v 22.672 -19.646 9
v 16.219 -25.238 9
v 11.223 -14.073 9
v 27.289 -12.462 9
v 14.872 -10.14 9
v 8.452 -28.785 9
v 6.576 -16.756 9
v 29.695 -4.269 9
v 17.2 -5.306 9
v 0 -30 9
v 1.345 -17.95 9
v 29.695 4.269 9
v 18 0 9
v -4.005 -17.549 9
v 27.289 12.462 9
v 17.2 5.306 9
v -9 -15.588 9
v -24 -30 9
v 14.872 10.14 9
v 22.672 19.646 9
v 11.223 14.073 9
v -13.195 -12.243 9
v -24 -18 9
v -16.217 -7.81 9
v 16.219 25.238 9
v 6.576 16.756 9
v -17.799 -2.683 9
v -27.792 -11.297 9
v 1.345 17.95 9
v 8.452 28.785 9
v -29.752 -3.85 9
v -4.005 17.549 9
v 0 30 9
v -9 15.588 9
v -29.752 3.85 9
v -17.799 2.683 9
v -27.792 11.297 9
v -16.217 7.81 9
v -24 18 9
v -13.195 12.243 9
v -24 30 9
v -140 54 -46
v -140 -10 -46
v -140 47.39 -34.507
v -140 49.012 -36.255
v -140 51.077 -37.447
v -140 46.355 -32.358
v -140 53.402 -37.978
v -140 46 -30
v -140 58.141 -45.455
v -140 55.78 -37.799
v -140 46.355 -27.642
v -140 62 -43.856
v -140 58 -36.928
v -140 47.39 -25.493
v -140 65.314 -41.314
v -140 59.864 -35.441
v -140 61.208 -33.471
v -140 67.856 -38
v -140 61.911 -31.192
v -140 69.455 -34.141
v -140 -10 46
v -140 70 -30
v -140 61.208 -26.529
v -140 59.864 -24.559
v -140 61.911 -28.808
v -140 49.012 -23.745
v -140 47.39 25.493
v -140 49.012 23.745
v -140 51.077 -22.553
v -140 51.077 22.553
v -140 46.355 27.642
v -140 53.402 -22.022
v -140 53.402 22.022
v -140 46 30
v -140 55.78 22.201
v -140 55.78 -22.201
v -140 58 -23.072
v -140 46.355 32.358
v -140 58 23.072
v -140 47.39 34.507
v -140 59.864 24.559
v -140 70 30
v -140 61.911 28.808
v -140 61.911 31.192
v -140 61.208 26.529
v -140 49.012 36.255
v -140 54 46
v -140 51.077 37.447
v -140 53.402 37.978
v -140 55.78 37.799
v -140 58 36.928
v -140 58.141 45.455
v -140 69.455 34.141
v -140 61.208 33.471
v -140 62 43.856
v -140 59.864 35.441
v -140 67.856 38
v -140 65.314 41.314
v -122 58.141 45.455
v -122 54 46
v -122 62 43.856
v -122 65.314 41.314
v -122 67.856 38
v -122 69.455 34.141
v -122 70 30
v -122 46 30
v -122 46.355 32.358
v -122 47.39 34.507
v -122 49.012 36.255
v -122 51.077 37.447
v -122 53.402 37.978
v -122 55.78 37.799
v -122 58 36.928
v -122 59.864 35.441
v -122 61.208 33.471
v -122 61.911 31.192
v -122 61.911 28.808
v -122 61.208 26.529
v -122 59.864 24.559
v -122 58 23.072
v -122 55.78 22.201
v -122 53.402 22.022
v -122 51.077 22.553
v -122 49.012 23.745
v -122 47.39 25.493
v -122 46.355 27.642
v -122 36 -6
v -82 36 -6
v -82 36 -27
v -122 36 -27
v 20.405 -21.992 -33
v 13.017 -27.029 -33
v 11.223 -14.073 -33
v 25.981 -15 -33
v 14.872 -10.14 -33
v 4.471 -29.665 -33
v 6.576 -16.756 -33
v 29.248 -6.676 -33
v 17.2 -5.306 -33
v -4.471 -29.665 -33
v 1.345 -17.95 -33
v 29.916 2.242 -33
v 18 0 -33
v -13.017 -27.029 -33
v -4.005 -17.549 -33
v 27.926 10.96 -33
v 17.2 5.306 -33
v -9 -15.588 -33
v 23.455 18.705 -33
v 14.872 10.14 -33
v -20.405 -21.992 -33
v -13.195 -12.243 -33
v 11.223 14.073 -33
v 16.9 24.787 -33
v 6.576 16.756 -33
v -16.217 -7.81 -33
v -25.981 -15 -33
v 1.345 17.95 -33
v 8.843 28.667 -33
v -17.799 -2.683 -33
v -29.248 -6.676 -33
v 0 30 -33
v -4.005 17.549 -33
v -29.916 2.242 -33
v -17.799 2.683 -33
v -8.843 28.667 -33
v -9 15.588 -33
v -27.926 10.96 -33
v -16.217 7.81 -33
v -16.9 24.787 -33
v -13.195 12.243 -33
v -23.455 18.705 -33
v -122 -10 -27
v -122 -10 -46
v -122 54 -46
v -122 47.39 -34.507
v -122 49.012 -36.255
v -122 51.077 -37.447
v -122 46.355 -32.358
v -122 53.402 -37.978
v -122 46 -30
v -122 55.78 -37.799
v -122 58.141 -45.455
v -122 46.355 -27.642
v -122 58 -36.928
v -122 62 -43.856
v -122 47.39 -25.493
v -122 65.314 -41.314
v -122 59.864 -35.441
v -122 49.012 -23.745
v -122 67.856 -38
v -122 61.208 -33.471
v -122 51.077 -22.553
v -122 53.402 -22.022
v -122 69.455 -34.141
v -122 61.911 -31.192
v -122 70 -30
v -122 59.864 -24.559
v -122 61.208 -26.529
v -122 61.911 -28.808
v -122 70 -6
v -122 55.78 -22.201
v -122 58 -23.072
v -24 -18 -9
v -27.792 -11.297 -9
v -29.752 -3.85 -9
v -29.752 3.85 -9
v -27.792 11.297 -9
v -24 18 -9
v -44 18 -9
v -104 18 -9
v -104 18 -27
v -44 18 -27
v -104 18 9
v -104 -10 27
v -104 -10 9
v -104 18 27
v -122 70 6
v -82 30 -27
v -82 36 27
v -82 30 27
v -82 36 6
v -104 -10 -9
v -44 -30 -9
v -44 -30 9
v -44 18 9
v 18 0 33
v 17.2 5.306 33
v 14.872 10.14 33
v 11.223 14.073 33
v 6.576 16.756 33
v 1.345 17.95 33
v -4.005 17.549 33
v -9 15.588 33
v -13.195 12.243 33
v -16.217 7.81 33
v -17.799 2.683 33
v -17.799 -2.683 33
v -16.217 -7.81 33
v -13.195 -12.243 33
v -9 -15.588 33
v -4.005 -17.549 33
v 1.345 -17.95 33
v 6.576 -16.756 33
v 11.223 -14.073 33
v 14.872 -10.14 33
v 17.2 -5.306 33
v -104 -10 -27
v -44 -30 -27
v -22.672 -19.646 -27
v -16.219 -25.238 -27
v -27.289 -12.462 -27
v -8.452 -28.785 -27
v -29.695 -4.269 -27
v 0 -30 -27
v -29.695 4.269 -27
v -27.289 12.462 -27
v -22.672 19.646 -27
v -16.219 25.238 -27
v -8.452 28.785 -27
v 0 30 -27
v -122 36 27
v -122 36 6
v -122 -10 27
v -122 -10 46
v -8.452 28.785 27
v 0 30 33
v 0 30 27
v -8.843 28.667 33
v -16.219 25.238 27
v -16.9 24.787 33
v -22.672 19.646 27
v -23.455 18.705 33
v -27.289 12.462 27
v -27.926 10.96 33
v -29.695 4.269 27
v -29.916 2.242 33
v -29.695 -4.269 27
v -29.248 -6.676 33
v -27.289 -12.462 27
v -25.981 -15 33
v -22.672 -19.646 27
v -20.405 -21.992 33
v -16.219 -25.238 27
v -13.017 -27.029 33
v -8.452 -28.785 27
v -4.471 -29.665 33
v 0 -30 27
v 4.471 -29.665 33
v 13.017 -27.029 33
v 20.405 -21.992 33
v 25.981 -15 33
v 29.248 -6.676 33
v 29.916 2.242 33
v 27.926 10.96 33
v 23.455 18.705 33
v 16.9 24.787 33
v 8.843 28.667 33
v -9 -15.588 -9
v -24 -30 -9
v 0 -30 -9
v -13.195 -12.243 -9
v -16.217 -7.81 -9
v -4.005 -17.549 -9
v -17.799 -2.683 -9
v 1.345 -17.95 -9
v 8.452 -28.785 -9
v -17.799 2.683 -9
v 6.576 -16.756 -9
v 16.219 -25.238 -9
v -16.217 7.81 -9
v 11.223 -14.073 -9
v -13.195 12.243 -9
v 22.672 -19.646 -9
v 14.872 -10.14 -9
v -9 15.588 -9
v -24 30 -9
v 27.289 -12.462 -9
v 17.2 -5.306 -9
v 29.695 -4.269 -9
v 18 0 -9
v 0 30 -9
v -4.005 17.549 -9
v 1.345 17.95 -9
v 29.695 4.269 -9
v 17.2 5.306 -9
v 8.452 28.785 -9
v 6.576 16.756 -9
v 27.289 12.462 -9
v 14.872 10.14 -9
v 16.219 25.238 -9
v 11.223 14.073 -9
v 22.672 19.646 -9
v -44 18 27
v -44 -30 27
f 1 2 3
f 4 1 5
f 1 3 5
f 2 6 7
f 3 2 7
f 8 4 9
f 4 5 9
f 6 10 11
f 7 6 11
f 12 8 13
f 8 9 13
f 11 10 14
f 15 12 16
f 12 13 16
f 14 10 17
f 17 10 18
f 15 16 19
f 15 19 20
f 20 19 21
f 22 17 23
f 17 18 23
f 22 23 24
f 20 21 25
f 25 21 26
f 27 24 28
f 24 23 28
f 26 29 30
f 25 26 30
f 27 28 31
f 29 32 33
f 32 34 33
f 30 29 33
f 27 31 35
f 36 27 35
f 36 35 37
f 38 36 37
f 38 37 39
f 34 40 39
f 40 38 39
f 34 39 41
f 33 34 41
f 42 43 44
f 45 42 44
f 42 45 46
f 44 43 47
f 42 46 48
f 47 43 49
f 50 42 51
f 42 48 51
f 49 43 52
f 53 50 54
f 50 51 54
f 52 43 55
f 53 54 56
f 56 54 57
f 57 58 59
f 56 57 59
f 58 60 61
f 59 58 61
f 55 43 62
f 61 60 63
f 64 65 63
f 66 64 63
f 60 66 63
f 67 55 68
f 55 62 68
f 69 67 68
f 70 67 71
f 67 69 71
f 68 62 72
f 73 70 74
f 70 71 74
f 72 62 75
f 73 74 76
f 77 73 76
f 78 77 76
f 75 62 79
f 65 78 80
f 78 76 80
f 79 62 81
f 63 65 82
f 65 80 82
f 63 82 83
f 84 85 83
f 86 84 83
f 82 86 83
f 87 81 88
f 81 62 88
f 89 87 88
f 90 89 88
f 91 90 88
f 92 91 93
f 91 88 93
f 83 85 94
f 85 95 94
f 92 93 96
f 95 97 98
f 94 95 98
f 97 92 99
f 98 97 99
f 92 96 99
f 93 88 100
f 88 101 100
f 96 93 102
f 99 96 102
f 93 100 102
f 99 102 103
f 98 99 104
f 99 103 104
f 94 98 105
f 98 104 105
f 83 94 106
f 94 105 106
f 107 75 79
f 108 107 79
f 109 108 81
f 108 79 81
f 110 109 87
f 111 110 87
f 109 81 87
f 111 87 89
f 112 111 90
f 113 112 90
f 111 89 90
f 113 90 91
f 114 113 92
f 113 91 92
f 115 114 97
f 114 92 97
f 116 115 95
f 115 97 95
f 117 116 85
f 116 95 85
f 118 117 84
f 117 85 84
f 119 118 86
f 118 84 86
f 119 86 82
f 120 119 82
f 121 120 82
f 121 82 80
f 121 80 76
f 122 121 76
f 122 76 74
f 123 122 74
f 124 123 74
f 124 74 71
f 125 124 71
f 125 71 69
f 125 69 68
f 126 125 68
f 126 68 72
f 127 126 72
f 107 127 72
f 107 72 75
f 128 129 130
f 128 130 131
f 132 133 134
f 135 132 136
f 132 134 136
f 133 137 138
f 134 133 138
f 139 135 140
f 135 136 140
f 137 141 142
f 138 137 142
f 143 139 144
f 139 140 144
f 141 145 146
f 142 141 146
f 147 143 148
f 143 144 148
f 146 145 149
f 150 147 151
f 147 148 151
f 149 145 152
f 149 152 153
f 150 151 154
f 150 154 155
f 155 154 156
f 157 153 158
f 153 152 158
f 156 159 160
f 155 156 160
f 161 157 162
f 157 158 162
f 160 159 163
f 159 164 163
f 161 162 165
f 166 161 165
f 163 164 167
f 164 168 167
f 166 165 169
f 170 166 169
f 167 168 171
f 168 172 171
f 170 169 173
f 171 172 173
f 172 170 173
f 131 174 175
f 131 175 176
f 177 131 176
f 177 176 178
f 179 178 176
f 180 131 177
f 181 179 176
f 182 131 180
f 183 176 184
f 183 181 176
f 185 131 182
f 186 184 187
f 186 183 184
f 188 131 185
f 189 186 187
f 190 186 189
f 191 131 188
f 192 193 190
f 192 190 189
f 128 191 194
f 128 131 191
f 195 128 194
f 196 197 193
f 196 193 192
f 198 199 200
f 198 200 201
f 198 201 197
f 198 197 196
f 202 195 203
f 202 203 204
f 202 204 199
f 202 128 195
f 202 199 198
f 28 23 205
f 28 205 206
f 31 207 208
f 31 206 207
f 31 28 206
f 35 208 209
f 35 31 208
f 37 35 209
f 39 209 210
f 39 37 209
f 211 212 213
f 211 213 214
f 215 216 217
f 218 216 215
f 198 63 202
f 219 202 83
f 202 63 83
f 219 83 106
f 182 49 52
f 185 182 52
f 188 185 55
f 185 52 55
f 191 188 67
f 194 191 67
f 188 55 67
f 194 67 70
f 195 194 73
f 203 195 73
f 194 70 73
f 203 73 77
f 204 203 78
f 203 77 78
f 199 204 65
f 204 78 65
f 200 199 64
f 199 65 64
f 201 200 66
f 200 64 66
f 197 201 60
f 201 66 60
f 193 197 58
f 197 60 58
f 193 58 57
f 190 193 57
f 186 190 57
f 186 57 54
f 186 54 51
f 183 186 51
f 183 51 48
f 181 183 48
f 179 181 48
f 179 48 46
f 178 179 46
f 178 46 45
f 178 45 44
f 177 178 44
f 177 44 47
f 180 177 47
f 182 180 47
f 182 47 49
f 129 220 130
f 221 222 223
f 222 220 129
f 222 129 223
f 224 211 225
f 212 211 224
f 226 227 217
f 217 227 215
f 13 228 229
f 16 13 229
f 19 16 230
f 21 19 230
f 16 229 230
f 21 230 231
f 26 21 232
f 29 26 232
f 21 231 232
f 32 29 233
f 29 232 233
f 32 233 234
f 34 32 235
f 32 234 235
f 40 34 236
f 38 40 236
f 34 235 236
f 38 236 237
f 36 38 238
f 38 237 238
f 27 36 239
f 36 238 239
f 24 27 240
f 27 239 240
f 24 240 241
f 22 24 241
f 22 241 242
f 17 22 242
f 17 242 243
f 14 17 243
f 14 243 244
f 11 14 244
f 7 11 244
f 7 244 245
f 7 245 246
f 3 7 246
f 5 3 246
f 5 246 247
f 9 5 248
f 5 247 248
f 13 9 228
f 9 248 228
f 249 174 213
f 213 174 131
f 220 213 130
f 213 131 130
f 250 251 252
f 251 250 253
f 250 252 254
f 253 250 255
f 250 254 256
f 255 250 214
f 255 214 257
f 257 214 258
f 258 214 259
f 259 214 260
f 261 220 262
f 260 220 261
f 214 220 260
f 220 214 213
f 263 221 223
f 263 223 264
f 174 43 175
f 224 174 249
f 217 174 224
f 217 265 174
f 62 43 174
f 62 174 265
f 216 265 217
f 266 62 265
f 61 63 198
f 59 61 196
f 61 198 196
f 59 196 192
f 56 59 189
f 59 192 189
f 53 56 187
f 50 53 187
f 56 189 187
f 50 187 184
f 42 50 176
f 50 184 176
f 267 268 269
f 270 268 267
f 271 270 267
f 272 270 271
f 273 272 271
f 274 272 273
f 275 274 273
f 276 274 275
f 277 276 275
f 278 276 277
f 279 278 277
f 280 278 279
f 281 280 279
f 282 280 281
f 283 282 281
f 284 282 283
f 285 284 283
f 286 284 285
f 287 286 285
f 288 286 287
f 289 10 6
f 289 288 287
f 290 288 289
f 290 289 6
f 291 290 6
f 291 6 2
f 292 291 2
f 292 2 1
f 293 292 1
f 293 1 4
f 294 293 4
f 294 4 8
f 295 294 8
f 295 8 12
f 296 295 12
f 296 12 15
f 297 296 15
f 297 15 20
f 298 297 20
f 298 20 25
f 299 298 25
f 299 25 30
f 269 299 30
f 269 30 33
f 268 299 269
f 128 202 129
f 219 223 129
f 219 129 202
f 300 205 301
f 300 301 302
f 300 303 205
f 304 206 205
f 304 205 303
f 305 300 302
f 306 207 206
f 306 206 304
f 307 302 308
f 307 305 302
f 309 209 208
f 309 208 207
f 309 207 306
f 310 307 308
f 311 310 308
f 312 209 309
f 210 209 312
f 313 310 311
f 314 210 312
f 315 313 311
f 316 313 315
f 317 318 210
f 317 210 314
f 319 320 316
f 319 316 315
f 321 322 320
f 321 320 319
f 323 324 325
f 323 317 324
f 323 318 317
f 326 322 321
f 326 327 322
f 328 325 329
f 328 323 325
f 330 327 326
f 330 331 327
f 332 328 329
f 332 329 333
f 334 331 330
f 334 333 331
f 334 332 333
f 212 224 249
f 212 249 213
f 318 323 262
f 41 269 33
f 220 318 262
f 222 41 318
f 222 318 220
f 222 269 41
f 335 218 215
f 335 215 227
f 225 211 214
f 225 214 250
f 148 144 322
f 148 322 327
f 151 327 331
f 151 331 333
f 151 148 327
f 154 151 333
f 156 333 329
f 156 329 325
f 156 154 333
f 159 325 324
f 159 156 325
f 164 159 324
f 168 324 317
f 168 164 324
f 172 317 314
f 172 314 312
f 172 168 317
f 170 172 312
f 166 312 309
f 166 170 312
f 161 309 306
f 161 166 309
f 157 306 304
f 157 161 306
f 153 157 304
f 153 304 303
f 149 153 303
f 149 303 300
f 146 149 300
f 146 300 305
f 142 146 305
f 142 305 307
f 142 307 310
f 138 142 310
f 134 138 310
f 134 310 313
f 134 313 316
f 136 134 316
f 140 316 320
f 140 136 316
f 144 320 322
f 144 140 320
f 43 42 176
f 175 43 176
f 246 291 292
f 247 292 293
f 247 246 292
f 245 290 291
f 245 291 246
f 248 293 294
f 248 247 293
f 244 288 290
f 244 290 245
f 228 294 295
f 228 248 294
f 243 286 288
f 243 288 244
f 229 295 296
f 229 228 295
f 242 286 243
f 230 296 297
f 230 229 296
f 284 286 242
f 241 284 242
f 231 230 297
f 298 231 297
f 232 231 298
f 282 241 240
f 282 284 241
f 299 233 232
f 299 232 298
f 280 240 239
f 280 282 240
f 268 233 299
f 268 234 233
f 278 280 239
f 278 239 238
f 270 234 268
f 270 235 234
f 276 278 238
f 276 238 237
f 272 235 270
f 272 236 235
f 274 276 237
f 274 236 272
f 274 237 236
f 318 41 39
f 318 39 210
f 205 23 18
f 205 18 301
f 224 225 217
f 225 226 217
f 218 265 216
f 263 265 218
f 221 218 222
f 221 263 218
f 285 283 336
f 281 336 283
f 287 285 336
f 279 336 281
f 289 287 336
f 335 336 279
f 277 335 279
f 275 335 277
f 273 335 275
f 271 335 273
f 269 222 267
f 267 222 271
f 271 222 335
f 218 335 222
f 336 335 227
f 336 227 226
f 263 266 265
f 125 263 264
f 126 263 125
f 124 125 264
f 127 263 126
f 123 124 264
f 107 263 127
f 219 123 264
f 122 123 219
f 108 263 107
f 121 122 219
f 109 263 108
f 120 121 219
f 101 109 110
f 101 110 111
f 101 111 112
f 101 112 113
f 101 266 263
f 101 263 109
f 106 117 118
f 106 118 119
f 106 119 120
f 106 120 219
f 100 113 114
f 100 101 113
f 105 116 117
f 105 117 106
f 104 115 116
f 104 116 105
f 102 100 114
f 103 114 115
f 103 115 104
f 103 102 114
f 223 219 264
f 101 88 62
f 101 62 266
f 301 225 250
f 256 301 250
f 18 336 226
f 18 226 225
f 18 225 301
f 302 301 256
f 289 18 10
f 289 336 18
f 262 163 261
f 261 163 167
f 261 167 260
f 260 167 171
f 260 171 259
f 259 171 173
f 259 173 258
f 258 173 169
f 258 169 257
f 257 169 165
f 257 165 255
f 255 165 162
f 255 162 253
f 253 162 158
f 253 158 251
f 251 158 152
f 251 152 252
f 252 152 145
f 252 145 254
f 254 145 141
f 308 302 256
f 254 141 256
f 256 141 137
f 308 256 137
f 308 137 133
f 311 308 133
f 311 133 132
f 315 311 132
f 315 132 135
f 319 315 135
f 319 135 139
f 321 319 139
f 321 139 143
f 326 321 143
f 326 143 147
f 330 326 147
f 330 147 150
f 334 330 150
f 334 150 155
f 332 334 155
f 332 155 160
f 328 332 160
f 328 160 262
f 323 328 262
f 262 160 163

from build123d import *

# Parameters (mm, degrees)
BOSS_EXTRUDE1_DEPTH    = 46
BOSS_EXTRUDE2_DEPTH    = 27
BOSS_EXTRUDE3_START    = 33
SKETCH1_4_R            = 18
BOSS_EXTRUDE3_DEPTH    = 24
FILLET1_R              = 16
BOSS_EXTRUDE4_DEPTH    = 6
BOSS_EXTRUDE5_DEPTH    = 9
F_16_0MM_DOWEL_HOLE1_D = 16
SKETCH3_W              = 48
SKETCH3_H              = 18
CUT_EXTRUDE1_DEPTH     = 88


with BuildPart() as part:
    # Sketch1 → Boss-Extrude1 (new, symmetric)
    with BuildSketch(Plane.XY):
        Polygon((-122, 36), (-122, 70), (-140, 70), (-140, -10), (-122, -10), align=None)
    extrude(amount=BOSS_EXTRUDE1_DEPTH, both=True)

    # Sketch1<3> → Boss-Extrude2 (add, symmetric)
    with BuildSketch(Plane.XY):
        with BuildLine():
            ThreePointArc((0, -30), (-30, 0), (0, 30))
            Line((0, 30), (-82, 30))
            Line((-82, 30), (-82, 36))
            Line((-82, 36), (-122, 36))
            Line((-122, 36), (-122, -10))
            Line((-122, -10), (-104, -10))
            Line((-104, -10), (-104, 18))
            Line((-104, 18), (-44, 18))
            Line((-44, 18), (-44, -30))
            Line((-44, -30), (0, -30))
        make_face()
    extrude(amount=BOSS_EXTRUDE2_DEPTH, both=True)

    # Sketch1<4> → Boss-Extrude3 (add)
    with BuildSketch(Plane.XY.offset(BOSS_EXTRUDE3_START)):
        with BuildLine():
            ThreePointArc((30, 0), (21.213203436, 21.213203436), (0, 30))
            ThreePointArc((0, 30), (-30, 0), (0, -30))
            ThreePointArc((0, -30), (21.213203436, -21.213203436), (30, 0))
        make_face()
        Circle(SKETCH1_4_R, mode=Mode.SUBTRACT)
    boss_extrude3 = extrude(amount=-BOSS_EXTRUDE3_DEPTH)

    # Mirror1: Boss-Extrude3 across plane
    add(boss_extrude3.mirror(Plane.XY))

    # Fillet1
    fillet1_edges = [part.edges().sort_by_distance(p)[0] for p in [
        (-131, 70, -46),
        (-131, 70, 46),
    ]]
    fillet(fillet1_edges, radius=FILLET1_R)

    # Sketch1<7> → Boss-Extrude4 (add, symmetric)
    with BuildSketch(Plane.XY):
        Polygon((-122, 36), (-82, 36), (-122, 70), align=None)
    extrude(amount=BOSS_EXTRUDE4_DEPTH, both=True)

    # Sketch1<8> → Boss-Extrude5 (add, symmetric)
    with BuildSketch(Plane.XY):
        Polygon((-104, -10), (-44, -30), (-44, 18), (-104, 18), align=None)
    extrude(amount=BOSS_EXTRUDE5_DEPTH, both=True)

    # Ø16.0mm Dowel Hole1 (through all)
    with Locations(Plane(origin=(-122, 54, 30), x_dir=(0, 1, 0), z_dir=(1, 0, 0))):
        with Locations((0, 0), (0, -60)):
            Hole(F_16_0MM_DOWEL_HOLE1_D / 2)

    # Sketch3 → Cut-Extrude1 (cut)
    with BuildSketch(Plane(origin=(0, 30, 0), x_dir=(1, 0, 0), z_dir=(0, 1, 0))):
        Rectangle(SKETCH3_W, SKETCH3_H)
    extrude(amount=-CUT_EXTRUDE1_DEPTH, mode=Mode.SUBTRACT)


solid = part.part
